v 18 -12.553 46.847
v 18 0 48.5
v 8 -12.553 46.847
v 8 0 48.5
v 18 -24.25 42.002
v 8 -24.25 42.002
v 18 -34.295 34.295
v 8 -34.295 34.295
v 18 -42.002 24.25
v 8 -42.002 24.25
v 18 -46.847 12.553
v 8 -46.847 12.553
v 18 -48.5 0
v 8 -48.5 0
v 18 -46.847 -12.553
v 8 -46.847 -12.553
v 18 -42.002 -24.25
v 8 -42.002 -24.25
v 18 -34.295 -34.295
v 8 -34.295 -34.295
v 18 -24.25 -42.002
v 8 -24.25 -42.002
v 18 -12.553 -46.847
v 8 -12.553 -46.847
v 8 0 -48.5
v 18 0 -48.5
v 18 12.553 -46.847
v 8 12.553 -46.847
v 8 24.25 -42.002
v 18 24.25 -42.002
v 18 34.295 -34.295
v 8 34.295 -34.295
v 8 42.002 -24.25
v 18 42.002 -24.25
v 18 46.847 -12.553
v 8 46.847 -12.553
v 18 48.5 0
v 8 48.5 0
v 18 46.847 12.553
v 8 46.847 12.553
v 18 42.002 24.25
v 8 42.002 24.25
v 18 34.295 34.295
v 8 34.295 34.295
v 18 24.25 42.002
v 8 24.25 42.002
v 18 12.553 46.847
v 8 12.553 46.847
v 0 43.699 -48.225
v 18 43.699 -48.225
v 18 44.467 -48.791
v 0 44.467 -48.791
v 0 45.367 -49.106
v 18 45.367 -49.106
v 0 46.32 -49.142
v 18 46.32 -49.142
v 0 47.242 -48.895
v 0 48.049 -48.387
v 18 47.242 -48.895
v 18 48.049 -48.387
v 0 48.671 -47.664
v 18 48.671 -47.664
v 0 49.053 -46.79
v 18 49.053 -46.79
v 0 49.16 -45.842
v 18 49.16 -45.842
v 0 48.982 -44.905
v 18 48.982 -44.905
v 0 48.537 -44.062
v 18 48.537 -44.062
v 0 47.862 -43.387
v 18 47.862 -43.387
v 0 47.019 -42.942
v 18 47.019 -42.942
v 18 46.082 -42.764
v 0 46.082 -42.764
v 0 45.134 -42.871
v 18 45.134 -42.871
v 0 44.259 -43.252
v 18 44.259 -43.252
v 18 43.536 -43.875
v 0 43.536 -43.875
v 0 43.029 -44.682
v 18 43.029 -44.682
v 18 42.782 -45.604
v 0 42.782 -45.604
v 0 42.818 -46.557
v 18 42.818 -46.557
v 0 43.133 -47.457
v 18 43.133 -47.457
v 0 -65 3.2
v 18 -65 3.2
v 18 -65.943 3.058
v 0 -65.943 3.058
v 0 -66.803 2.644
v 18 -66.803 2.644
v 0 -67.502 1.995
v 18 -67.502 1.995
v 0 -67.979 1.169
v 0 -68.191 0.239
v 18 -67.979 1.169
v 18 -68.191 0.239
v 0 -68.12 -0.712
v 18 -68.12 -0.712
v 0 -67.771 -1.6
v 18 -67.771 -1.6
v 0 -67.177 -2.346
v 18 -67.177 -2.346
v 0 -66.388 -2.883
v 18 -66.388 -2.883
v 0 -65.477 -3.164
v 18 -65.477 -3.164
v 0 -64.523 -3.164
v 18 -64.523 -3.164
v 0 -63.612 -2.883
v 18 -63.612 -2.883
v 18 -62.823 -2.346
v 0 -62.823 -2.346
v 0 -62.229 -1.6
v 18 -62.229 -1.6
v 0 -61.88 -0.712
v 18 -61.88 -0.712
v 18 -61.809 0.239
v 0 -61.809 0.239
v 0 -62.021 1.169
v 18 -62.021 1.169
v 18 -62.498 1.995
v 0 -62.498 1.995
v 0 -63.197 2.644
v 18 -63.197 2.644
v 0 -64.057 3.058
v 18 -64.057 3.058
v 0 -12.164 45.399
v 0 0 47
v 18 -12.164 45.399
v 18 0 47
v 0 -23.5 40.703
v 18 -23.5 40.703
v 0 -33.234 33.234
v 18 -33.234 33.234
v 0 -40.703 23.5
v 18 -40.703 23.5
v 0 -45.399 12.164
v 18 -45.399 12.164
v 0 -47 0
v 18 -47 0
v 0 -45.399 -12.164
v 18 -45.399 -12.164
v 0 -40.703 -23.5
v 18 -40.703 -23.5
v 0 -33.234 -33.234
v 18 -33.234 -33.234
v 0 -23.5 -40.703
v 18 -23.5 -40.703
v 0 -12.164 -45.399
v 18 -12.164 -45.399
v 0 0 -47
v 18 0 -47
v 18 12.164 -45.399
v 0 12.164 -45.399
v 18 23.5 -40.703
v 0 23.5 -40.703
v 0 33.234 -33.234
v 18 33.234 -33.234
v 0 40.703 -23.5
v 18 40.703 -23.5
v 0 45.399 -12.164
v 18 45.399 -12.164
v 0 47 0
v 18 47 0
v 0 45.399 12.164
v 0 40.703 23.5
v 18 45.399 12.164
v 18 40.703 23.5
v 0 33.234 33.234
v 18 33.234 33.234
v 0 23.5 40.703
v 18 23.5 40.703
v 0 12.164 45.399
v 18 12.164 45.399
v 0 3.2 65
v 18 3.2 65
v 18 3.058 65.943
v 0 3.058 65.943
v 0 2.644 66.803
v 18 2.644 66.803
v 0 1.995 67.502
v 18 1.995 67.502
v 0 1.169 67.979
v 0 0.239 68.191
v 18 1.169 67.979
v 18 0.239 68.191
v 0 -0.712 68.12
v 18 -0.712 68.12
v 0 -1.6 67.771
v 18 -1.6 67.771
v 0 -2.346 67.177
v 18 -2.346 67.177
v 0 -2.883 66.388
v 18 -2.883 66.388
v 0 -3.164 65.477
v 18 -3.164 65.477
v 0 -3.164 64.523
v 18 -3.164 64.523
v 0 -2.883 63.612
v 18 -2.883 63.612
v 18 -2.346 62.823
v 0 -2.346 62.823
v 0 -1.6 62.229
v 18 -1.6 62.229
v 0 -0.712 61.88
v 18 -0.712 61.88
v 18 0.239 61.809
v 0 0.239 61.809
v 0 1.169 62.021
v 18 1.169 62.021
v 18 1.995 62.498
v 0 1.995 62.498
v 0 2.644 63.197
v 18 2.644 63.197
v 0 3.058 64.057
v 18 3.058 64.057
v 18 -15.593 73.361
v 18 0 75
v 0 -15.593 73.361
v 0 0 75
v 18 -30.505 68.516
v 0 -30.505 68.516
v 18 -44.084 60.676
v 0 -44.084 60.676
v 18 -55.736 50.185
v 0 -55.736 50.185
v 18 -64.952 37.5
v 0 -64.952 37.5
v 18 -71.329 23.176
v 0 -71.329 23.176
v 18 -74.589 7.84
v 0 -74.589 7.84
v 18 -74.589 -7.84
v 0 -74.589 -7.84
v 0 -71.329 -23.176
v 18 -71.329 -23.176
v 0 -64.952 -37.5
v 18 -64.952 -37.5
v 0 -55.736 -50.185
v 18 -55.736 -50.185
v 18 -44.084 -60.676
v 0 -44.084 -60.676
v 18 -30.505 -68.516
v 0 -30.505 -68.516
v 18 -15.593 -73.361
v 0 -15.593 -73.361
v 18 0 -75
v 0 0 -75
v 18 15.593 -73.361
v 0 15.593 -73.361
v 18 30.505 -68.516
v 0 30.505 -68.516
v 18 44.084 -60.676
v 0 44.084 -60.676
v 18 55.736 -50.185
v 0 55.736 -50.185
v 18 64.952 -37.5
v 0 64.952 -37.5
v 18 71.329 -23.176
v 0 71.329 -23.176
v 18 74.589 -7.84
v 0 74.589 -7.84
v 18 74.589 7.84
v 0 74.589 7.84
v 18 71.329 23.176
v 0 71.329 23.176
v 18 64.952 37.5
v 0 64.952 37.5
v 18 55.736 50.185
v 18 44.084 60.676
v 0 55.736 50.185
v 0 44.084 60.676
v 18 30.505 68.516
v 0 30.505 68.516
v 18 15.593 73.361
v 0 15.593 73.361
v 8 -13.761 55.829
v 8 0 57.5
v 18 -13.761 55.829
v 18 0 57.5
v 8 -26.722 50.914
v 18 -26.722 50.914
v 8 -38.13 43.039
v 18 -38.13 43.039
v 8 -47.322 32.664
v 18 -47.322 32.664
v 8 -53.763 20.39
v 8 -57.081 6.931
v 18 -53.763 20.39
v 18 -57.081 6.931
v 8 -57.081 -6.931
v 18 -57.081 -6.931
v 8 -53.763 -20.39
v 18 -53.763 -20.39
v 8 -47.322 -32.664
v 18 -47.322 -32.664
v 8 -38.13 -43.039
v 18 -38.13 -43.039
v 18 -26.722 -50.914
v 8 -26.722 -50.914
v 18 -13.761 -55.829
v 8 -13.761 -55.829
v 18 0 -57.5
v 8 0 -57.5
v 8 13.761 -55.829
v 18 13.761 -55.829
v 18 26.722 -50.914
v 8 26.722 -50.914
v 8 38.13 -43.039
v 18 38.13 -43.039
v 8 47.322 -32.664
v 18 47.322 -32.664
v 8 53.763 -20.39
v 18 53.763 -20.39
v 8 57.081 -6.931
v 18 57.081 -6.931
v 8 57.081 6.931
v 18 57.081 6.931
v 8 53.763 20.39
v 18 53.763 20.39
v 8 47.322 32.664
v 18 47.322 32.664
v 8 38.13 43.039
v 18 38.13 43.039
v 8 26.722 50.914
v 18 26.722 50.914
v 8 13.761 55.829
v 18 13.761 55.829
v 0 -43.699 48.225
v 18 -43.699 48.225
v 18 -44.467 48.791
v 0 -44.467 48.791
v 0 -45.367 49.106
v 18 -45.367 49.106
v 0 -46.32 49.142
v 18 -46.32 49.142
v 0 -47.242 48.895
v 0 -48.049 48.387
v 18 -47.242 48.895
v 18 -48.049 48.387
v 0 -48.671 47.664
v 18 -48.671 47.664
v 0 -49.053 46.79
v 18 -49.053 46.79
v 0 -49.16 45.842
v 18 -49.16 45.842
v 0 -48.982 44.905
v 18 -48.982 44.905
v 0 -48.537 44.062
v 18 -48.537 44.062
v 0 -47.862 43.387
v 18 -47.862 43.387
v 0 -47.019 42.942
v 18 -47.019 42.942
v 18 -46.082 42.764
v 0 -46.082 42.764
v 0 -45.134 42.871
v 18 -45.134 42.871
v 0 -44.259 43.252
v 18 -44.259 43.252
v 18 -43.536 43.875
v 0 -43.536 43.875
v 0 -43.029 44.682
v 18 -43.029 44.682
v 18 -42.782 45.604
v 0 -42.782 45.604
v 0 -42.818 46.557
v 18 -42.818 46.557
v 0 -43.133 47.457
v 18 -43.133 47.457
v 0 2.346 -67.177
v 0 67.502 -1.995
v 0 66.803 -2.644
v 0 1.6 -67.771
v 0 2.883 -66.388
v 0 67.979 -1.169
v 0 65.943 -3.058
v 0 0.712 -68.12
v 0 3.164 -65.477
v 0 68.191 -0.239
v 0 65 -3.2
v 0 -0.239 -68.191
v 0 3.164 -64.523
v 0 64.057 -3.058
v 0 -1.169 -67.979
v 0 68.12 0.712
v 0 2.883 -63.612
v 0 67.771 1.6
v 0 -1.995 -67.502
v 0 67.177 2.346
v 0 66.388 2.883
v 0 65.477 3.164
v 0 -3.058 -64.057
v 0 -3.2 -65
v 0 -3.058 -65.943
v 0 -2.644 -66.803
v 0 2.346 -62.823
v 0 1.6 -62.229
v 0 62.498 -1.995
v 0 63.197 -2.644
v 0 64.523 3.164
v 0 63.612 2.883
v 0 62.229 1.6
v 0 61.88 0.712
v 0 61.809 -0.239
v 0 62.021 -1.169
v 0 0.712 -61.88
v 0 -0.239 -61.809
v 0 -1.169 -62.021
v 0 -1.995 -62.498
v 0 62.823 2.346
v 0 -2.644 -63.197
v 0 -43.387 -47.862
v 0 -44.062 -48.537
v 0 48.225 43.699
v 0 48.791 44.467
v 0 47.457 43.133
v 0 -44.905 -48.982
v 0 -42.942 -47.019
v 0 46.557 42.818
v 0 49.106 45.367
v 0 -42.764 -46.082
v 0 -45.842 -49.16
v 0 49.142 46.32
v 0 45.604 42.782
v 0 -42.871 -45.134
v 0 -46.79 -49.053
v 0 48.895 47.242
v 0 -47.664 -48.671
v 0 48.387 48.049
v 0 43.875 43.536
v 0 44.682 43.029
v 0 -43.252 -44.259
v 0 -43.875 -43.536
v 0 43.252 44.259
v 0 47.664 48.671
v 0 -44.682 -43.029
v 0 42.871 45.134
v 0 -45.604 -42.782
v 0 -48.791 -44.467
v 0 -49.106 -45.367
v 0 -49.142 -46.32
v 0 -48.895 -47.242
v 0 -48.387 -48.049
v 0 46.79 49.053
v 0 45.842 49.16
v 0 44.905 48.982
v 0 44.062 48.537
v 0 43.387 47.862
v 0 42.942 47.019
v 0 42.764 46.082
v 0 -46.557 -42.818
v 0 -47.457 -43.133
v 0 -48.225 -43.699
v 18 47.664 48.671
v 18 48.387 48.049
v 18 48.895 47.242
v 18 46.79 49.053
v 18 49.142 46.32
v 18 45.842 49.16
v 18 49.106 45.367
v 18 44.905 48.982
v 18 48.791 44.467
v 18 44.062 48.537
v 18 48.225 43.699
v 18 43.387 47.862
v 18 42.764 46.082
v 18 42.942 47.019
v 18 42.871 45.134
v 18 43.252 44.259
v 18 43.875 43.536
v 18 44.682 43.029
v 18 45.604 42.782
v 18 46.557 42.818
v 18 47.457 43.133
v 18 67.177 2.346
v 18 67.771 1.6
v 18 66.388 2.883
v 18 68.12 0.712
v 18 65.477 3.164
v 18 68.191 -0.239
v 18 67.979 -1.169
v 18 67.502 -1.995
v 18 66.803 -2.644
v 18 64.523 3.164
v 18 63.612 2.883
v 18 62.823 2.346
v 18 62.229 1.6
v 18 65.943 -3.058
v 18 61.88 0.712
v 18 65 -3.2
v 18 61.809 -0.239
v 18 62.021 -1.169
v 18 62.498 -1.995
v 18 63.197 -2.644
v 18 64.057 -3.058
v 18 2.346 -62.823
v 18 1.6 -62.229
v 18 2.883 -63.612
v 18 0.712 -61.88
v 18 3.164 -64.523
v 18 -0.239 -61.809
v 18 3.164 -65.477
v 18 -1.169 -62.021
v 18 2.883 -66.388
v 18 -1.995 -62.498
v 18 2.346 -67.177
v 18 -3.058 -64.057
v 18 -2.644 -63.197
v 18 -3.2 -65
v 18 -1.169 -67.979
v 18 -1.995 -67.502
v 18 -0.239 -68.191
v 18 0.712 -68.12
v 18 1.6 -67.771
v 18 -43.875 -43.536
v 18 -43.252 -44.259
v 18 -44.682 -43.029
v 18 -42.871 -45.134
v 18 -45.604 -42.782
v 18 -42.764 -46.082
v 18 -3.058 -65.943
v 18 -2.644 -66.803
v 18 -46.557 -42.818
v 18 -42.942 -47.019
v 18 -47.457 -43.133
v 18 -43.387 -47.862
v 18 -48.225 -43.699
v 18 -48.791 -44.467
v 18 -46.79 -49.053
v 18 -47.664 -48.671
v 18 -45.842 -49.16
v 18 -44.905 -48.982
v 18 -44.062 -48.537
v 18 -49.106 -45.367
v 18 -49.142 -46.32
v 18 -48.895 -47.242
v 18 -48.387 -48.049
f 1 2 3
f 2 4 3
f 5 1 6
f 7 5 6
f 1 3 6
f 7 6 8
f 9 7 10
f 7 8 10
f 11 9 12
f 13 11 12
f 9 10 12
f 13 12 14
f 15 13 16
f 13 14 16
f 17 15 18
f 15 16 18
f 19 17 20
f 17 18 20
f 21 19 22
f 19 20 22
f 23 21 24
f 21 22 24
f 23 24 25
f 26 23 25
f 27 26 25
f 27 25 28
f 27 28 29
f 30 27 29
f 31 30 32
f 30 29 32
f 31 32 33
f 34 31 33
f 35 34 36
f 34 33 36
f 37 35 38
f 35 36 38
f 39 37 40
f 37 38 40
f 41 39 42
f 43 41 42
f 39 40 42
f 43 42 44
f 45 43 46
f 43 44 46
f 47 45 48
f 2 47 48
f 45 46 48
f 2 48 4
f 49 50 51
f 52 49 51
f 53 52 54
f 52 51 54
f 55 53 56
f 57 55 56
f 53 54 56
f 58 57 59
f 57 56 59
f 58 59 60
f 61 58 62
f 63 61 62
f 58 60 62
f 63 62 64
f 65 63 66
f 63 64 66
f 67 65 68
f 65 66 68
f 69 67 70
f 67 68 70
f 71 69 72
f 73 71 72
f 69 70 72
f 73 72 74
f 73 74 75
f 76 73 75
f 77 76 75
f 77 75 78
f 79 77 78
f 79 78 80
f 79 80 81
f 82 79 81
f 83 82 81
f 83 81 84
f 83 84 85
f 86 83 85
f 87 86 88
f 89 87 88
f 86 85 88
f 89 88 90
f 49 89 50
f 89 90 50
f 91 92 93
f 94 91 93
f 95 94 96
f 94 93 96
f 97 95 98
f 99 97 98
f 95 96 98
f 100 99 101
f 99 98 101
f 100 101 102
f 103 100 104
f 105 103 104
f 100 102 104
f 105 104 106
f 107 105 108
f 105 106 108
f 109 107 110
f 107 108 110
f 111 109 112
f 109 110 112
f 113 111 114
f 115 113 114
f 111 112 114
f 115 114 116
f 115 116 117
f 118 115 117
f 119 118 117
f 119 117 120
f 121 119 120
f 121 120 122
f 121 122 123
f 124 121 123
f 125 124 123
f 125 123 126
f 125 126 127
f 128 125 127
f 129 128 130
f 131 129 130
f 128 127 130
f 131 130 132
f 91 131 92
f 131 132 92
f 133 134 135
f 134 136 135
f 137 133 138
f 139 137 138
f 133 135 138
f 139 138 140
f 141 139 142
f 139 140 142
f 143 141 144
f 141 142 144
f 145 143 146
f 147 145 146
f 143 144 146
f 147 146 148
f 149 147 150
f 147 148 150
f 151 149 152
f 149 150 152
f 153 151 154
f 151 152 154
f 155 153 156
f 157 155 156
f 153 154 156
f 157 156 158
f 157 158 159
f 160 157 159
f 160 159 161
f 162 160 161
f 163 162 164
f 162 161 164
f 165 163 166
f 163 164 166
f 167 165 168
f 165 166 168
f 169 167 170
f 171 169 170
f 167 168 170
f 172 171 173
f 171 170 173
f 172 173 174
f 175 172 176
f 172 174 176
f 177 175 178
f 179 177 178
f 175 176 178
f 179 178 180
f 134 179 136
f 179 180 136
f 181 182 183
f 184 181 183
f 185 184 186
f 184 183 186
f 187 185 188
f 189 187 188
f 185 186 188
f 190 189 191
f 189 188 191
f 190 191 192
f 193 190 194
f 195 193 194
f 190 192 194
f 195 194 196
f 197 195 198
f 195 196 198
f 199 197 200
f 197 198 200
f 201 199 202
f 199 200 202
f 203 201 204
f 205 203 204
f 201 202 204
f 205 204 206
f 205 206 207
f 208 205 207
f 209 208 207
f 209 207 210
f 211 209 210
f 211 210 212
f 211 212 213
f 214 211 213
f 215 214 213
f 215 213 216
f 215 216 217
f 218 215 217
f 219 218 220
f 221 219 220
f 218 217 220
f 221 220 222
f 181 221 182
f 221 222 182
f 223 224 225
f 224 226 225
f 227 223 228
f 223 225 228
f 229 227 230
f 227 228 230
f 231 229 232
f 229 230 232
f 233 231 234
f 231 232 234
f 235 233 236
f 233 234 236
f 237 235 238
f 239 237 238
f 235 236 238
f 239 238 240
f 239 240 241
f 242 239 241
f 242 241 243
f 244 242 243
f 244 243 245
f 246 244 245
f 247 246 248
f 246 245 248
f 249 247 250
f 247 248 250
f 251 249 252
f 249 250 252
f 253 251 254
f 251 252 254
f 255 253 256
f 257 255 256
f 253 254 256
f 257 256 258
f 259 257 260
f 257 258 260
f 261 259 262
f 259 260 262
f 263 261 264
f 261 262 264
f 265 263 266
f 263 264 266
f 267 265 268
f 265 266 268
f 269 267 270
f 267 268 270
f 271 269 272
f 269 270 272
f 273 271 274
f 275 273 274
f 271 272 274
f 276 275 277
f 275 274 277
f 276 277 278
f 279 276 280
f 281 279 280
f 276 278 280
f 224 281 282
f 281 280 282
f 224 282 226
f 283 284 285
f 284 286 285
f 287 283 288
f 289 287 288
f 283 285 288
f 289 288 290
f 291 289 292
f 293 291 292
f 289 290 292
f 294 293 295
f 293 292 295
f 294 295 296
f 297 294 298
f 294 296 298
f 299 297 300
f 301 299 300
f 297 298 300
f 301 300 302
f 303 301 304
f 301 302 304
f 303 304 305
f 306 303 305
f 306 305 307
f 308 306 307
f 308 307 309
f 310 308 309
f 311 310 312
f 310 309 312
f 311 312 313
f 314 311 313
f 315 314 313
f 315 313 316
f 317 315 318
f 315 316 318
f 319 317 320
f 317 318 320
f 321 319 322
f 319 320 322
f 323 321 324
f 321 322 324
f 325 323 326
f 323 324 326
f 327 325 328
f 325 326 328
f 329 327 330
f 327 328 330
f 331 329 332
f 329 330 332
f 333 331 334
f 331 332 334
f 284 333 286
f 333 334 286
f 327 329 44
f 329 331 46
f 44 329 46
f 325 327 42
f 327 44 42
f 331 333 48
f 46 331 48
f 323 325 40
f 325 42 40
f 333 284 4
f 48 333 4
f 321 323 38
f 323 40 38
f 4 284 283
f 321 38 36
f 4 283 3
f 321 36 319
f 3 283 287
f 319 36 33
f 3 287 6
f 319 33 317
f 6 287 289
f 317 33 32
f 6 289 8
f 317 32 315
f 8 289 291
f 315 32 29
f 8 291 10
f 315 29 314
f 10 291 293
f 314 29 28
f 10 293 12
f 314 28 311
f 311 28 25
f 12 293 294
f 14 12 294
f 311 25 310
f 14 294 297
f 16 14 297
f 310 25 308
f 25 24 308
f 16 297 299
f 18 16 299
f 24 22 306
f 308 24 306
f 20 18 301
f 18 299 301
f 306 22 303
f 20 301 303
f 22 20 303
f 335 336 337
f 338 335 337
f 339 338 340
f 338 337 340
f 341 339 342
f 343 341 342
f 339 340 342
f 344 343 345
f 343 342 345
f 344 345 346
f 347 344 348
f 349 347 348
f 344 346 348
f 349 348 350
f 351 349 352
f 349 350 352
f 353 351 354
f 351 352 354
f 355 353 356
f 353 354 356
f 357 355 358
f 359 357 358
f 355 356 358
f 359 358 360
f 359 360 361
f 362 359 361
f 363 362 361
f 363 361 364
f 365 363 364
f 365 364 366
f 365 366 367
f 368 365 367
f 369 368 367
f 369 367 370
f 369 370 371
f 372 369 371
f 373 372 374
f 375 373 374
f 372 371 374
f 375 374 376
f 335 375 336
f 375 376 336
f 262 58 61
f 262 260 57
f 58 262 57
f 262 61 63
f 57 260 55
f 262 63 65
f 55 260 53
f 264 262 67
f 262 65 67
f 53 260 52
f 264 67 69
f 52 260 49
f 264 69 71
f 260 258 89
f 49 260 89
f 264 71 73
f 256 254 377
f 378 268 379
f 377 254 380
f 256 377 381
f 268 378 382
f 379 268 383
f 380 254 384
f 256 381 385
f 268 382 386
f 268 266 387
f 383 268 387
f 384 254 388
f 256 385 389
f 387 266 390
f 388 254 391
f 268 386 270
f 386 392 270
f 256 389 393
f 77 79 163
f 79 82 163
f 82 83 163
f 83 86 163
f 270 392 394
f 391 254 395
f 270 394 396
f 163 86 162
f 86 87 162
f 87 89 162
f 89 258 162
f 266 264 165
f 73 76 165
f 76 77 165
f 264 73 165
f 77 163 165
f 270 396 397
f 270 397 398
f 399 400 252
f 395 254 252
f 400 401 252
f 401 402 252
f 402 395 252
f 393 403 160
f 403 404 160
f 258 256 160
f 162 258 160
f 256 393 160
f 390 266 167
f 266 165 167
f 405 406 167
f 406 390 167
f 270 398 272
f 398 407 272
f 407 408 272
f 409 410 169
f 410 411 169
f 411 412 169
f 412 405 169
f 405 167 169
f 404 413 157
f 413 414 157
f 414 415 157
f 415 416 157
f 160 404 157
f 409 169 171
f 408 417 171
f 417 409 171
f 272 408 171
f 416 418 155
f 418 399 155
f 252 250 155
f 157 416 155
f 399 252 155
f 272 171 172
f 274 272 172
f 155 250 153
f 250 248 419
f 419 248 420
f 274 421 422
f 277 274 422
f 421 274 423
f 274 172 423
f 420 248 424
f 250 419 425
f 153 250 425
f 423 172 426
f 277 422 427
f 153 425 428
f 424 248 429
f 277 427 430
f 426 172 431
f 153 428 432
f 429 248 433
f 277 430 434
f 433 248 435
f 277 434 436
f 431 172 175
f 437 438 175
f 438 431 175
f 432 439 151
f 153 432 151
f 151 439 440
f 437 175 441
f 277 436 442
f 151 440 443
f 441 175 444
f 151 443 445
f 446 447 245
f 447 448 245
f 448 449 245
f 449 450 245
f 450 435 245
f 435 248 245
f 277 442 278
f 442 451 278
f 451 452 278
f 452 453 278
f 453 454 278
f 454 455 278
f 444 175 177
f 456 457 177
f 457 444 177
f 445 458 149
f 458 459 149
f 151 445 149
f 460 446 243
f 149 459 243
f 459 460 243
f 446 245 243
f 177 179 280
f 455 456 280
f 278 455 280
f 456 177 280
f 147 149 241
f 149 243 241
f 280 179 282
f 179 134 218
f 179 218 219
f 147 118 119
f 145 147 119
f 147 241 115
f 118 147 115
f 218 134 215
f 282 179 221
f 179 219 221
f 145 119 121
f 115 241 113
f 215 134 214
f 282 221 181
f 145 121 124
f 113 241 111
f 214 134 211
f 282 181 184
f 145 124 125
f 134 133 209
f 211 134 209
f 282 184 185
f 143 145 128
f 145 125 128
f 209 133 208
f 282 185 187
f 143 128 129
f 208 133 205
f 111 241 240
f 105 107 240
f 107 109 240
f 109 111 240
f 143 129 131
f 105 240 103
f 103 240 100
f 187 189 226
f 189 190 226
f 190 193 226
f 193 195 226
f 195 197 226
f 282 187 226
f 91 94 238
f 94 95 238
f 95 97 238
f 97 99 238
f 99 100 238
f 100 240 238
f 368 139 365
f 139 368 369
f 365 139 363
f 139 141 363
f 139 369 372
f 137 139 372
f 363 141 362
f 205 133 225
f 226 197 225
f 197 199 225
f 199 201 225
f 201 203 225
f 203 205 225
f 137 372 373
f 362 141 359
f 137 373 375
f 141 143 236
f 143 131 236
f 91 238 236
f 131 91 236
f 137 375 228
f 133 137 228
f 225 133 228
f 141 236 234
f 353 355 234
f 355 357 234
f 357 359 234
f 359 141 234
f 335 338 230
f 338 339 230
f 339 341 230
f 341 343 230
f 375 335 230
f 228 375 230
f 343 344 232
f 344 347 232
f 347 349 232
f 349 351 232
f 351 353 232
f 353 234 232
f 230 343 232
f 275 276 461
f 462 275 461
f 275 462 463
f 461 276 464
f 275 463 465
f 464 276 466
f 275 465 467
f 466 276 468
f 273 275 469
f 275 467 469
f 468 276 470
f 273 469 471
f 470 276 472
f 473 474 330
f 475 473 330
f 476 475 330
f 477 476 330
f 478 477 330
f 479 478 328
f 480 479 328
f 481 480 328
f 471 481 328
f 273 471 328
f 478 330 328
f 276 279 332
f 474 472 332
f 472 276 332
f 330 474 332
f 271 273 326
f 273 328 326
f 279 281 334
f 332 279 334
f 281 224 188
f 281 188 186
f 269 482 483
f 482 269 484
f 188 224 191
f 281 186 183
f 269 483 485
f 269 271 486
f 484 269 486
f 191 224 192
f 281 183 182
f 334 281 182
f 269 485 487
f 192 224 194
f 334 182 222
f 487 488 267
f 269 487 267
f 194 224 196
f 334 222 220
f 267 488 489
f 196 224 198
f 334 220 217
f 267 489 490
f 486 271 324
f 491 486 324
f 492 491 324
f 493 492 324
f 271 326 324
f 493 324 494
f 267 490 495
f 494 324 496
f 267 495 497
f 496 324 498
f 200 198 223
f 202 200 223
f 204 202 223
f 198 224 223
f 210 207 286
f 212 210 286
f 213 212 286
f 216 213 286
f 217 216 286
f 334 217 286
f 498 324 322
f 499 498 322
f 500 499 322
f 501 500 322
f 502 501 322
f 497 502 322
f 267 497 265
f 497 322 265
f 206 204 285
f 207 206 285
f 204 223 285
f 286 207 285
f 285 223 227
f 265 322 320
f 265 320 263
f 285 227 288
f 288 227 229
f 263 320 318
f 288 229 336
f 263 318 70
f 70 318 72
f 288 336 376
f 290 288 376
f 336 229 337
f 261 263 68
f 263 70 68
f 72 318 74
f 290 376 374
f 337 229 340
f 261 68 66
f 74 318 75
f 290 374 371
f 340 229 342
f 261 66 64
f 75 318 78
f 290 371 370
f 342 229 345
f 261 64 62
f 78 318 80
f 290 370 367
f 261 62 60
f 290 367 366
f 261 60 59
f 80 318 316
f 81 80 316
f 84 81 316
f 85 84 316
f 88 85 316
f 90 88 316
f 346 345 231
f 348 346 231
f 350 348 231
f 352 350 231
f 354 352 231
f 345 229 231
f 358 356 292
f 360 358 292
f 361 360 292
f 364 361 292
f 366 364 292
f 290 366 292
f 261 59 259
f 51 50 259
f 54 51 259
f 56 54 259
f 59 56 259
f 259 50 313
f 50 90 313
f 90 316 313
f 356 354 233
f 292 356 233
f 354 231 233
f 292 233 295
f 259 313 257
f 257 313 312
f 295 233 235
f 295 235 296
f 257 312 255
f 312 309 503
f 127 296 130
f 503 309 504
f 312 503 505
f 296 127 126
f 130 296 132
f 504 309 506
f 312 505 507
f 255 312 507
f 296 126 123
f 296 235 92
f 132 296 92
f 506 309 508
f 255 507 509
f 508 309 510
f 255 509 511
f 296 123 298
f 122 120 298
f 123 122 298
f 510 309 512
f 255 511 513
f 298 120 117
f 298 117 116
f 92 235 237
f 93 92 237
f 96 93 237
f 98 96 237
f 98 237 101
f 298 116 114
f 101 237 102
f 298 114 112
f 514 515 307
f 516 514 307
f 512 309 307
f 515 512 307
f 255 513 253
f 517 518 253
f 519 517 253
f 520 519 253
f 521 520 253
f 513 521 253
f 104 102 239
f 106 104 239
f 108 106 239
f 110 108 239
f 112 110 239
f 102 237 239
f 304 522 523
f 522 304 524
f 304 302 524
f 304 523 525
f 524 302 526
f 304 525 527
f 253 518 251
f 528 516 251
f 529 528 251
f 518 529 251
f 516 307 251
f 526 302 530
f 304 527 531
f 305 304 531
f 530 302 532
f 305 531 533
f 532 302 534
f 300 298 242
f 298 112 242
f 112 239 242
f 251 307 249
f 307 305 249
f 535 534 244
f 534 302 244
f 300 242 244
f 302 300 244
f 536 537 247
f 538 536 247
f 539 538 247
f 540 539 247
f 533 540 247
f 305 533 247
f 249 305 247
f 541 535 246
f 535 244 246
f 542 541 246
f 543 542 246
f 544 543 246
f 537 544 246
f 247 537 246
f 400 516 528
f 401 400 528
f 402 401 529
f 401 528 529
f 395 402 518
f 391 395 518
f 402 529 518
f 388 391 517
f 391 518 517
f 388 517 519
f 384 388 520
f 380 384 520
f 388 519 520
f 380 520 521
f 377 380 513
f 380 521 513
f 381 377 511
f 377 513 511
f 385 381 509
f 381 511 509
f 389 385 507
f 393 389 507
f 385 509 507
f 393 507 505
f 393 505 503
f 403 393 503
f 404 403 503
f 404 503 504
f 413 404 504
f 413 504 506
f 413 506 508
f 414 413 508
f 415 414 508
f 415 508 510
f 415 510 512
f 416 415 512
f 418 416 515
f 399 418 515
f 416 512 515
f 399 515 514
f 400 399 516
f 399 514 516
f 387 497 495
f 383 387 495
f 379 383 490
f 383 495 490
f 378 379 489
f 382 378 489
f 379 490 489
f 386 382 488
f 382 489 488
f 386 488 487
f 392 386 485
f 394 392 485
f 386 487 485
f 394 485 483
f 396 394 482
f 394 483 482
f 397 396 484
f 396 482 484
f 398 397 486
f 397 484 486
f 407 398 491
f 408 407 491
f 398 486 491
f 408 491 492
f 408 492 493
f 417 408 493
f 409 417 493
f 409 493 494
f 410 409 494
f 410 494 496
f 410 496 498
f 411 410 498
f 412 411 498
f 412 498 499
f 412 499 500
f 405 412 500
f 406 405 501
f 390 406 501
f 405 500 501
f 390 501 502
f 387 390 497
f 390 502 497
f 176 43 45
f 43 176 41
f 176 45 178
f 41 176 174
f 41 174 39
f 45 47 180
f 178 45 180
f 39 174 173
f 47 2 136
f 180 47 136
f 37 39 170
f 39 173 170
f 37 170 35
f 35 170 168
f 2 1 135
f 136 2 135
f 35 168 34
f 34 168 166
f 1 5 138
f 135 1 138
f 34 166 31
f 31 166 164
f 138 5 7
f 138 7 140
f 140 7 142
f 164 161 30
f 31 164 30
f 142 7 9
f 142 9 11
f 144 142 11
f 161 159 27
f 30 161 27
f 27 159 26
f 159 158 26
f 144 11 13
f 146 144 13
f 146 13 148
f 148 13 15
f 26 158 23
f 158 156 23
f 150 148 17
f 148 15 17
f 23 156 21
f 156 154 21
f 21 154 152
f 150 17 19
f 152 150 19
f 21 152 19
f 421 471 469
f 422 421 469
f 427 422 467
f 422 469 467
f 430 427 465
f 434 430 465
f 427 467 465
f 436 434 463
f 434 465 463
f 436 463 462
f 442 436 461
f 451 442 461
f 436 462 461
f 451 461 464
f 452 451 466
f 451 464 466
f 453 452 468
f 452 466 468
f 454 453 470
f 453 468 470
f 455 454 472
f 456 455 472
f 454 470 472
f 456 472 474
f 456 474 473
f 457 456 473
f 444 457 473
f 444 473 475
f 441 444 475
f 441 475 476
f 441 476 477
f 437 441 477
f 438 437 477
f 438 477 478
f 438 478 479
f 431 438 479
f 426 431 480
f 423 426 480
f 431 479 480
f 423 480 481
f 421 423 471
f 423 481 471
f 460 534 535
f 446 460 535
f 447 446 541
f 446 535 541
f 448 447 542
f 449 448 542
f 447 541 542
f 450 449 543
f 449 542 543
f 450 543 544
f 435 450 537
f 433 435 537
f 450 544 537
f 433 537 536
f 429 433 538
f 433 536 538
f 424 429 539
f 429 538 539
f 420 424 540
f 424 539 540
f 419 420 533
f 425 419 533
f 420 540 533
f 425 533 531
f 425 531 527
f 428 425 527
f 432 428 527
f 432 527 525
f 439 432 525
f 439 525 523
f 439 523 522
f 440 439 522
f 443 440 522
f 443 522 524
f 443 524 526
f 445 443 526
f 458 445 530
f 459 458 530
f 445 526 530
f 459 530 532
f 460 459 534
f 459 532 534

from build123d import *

# Parameters (mm, degrees)
F3_R     = 3.2
F4_DEPTH = 18
F5_COUNT = 8


with BuildPart() as f2:
    # F1 (on Front) → F2 (revolve)
    with BuildSketch(Plane.XZ):
        Polygon((0, 75), (0, 47), (18, 47), (18, 48.5), (8, 48.5), (8, 57.5), (18, 57.5), (18, 75), align=None)
    revolve(axis=Axis((9, 0, 0), (1, 0, 0)))


with BuildPart() as f4:
    # F3 (on face) → F4 (new body, through all)
    with BuildSketch(Plane.YZ.offset(18)):
        with Locations((0, 65)):
            Circle(F3_R)
    extrude(amount=-F4_DEPTH)


with BuildPart() as f5_1:
    # F5: instance of F4
    add(f4.part.rotate(Axis((18, 0, 0), (1, 0, 0)), 1 * 360 / F5_COUNT))


with BuildPart() as f5_2:
    # F5: instance of F4
    add(f4.part.rotate(Axis((18, 0, 0), (1, 0, 0)), 2 * 360 / F5_COUNT))


with BuildPart() as f5_3:
    # F5: instance of F4
    add(f4.part.rotate(Axis((18, 0, 0), (1, 0, 0)), 3 * 360 / F5_COUNT))


with BuildPart() as f5_4:
    # F5: instance of F4
    add(f4.part.rotate(Axis((18, 0, 0), (1, 0, 0)), 4 * 360 / F5_COUNT))


with BuildPart() as f5_5:
    # F5: instance of F4
    add(f4.part.rotate(Axis((18, 0, 0), (1, 0, 0)), 5 * 360 / F5_COUNT))


with BuildPart() as f5_6:
    # F5: instance of F4
    add(f4.part.rotate(Axis((18, 0, 0), (1, 0, 0)), 6 * 360 / F5_COUNT))


with BuildPart() as f5_7:
    # F5: instance of F4
    add(f4.part.rotate(Axis((18, 0, 0), (1, 0, 0)), 7 * 360 / F5_COUNT))


with BuildPart() as f2_1:
    add(f2.part)

    # F6: cut F4, F5_1, F5_2, F5_3, F5_4, F5_5, F5_6, F5_7
    add(f4.part, mode=Mode.SUBTRACT)
    add(f5_1.part, mode=Mode.SUBTRACT)
    add(f5_2.part, mode=Mode.SUBTRACT)
    add(f5_3.part, mode=Mode.SUBTRACT)
    add(f5_4.part, mode=Mode.SUBTRACT)
    add(f5_5.part, mode=Mode.SUBTRACT)
    add(f5_6.part, mode=Mode.SUBTRACT)
    add(f5_7.part, mode=Mode.SUBTRACT)


solid = f2_1.part
